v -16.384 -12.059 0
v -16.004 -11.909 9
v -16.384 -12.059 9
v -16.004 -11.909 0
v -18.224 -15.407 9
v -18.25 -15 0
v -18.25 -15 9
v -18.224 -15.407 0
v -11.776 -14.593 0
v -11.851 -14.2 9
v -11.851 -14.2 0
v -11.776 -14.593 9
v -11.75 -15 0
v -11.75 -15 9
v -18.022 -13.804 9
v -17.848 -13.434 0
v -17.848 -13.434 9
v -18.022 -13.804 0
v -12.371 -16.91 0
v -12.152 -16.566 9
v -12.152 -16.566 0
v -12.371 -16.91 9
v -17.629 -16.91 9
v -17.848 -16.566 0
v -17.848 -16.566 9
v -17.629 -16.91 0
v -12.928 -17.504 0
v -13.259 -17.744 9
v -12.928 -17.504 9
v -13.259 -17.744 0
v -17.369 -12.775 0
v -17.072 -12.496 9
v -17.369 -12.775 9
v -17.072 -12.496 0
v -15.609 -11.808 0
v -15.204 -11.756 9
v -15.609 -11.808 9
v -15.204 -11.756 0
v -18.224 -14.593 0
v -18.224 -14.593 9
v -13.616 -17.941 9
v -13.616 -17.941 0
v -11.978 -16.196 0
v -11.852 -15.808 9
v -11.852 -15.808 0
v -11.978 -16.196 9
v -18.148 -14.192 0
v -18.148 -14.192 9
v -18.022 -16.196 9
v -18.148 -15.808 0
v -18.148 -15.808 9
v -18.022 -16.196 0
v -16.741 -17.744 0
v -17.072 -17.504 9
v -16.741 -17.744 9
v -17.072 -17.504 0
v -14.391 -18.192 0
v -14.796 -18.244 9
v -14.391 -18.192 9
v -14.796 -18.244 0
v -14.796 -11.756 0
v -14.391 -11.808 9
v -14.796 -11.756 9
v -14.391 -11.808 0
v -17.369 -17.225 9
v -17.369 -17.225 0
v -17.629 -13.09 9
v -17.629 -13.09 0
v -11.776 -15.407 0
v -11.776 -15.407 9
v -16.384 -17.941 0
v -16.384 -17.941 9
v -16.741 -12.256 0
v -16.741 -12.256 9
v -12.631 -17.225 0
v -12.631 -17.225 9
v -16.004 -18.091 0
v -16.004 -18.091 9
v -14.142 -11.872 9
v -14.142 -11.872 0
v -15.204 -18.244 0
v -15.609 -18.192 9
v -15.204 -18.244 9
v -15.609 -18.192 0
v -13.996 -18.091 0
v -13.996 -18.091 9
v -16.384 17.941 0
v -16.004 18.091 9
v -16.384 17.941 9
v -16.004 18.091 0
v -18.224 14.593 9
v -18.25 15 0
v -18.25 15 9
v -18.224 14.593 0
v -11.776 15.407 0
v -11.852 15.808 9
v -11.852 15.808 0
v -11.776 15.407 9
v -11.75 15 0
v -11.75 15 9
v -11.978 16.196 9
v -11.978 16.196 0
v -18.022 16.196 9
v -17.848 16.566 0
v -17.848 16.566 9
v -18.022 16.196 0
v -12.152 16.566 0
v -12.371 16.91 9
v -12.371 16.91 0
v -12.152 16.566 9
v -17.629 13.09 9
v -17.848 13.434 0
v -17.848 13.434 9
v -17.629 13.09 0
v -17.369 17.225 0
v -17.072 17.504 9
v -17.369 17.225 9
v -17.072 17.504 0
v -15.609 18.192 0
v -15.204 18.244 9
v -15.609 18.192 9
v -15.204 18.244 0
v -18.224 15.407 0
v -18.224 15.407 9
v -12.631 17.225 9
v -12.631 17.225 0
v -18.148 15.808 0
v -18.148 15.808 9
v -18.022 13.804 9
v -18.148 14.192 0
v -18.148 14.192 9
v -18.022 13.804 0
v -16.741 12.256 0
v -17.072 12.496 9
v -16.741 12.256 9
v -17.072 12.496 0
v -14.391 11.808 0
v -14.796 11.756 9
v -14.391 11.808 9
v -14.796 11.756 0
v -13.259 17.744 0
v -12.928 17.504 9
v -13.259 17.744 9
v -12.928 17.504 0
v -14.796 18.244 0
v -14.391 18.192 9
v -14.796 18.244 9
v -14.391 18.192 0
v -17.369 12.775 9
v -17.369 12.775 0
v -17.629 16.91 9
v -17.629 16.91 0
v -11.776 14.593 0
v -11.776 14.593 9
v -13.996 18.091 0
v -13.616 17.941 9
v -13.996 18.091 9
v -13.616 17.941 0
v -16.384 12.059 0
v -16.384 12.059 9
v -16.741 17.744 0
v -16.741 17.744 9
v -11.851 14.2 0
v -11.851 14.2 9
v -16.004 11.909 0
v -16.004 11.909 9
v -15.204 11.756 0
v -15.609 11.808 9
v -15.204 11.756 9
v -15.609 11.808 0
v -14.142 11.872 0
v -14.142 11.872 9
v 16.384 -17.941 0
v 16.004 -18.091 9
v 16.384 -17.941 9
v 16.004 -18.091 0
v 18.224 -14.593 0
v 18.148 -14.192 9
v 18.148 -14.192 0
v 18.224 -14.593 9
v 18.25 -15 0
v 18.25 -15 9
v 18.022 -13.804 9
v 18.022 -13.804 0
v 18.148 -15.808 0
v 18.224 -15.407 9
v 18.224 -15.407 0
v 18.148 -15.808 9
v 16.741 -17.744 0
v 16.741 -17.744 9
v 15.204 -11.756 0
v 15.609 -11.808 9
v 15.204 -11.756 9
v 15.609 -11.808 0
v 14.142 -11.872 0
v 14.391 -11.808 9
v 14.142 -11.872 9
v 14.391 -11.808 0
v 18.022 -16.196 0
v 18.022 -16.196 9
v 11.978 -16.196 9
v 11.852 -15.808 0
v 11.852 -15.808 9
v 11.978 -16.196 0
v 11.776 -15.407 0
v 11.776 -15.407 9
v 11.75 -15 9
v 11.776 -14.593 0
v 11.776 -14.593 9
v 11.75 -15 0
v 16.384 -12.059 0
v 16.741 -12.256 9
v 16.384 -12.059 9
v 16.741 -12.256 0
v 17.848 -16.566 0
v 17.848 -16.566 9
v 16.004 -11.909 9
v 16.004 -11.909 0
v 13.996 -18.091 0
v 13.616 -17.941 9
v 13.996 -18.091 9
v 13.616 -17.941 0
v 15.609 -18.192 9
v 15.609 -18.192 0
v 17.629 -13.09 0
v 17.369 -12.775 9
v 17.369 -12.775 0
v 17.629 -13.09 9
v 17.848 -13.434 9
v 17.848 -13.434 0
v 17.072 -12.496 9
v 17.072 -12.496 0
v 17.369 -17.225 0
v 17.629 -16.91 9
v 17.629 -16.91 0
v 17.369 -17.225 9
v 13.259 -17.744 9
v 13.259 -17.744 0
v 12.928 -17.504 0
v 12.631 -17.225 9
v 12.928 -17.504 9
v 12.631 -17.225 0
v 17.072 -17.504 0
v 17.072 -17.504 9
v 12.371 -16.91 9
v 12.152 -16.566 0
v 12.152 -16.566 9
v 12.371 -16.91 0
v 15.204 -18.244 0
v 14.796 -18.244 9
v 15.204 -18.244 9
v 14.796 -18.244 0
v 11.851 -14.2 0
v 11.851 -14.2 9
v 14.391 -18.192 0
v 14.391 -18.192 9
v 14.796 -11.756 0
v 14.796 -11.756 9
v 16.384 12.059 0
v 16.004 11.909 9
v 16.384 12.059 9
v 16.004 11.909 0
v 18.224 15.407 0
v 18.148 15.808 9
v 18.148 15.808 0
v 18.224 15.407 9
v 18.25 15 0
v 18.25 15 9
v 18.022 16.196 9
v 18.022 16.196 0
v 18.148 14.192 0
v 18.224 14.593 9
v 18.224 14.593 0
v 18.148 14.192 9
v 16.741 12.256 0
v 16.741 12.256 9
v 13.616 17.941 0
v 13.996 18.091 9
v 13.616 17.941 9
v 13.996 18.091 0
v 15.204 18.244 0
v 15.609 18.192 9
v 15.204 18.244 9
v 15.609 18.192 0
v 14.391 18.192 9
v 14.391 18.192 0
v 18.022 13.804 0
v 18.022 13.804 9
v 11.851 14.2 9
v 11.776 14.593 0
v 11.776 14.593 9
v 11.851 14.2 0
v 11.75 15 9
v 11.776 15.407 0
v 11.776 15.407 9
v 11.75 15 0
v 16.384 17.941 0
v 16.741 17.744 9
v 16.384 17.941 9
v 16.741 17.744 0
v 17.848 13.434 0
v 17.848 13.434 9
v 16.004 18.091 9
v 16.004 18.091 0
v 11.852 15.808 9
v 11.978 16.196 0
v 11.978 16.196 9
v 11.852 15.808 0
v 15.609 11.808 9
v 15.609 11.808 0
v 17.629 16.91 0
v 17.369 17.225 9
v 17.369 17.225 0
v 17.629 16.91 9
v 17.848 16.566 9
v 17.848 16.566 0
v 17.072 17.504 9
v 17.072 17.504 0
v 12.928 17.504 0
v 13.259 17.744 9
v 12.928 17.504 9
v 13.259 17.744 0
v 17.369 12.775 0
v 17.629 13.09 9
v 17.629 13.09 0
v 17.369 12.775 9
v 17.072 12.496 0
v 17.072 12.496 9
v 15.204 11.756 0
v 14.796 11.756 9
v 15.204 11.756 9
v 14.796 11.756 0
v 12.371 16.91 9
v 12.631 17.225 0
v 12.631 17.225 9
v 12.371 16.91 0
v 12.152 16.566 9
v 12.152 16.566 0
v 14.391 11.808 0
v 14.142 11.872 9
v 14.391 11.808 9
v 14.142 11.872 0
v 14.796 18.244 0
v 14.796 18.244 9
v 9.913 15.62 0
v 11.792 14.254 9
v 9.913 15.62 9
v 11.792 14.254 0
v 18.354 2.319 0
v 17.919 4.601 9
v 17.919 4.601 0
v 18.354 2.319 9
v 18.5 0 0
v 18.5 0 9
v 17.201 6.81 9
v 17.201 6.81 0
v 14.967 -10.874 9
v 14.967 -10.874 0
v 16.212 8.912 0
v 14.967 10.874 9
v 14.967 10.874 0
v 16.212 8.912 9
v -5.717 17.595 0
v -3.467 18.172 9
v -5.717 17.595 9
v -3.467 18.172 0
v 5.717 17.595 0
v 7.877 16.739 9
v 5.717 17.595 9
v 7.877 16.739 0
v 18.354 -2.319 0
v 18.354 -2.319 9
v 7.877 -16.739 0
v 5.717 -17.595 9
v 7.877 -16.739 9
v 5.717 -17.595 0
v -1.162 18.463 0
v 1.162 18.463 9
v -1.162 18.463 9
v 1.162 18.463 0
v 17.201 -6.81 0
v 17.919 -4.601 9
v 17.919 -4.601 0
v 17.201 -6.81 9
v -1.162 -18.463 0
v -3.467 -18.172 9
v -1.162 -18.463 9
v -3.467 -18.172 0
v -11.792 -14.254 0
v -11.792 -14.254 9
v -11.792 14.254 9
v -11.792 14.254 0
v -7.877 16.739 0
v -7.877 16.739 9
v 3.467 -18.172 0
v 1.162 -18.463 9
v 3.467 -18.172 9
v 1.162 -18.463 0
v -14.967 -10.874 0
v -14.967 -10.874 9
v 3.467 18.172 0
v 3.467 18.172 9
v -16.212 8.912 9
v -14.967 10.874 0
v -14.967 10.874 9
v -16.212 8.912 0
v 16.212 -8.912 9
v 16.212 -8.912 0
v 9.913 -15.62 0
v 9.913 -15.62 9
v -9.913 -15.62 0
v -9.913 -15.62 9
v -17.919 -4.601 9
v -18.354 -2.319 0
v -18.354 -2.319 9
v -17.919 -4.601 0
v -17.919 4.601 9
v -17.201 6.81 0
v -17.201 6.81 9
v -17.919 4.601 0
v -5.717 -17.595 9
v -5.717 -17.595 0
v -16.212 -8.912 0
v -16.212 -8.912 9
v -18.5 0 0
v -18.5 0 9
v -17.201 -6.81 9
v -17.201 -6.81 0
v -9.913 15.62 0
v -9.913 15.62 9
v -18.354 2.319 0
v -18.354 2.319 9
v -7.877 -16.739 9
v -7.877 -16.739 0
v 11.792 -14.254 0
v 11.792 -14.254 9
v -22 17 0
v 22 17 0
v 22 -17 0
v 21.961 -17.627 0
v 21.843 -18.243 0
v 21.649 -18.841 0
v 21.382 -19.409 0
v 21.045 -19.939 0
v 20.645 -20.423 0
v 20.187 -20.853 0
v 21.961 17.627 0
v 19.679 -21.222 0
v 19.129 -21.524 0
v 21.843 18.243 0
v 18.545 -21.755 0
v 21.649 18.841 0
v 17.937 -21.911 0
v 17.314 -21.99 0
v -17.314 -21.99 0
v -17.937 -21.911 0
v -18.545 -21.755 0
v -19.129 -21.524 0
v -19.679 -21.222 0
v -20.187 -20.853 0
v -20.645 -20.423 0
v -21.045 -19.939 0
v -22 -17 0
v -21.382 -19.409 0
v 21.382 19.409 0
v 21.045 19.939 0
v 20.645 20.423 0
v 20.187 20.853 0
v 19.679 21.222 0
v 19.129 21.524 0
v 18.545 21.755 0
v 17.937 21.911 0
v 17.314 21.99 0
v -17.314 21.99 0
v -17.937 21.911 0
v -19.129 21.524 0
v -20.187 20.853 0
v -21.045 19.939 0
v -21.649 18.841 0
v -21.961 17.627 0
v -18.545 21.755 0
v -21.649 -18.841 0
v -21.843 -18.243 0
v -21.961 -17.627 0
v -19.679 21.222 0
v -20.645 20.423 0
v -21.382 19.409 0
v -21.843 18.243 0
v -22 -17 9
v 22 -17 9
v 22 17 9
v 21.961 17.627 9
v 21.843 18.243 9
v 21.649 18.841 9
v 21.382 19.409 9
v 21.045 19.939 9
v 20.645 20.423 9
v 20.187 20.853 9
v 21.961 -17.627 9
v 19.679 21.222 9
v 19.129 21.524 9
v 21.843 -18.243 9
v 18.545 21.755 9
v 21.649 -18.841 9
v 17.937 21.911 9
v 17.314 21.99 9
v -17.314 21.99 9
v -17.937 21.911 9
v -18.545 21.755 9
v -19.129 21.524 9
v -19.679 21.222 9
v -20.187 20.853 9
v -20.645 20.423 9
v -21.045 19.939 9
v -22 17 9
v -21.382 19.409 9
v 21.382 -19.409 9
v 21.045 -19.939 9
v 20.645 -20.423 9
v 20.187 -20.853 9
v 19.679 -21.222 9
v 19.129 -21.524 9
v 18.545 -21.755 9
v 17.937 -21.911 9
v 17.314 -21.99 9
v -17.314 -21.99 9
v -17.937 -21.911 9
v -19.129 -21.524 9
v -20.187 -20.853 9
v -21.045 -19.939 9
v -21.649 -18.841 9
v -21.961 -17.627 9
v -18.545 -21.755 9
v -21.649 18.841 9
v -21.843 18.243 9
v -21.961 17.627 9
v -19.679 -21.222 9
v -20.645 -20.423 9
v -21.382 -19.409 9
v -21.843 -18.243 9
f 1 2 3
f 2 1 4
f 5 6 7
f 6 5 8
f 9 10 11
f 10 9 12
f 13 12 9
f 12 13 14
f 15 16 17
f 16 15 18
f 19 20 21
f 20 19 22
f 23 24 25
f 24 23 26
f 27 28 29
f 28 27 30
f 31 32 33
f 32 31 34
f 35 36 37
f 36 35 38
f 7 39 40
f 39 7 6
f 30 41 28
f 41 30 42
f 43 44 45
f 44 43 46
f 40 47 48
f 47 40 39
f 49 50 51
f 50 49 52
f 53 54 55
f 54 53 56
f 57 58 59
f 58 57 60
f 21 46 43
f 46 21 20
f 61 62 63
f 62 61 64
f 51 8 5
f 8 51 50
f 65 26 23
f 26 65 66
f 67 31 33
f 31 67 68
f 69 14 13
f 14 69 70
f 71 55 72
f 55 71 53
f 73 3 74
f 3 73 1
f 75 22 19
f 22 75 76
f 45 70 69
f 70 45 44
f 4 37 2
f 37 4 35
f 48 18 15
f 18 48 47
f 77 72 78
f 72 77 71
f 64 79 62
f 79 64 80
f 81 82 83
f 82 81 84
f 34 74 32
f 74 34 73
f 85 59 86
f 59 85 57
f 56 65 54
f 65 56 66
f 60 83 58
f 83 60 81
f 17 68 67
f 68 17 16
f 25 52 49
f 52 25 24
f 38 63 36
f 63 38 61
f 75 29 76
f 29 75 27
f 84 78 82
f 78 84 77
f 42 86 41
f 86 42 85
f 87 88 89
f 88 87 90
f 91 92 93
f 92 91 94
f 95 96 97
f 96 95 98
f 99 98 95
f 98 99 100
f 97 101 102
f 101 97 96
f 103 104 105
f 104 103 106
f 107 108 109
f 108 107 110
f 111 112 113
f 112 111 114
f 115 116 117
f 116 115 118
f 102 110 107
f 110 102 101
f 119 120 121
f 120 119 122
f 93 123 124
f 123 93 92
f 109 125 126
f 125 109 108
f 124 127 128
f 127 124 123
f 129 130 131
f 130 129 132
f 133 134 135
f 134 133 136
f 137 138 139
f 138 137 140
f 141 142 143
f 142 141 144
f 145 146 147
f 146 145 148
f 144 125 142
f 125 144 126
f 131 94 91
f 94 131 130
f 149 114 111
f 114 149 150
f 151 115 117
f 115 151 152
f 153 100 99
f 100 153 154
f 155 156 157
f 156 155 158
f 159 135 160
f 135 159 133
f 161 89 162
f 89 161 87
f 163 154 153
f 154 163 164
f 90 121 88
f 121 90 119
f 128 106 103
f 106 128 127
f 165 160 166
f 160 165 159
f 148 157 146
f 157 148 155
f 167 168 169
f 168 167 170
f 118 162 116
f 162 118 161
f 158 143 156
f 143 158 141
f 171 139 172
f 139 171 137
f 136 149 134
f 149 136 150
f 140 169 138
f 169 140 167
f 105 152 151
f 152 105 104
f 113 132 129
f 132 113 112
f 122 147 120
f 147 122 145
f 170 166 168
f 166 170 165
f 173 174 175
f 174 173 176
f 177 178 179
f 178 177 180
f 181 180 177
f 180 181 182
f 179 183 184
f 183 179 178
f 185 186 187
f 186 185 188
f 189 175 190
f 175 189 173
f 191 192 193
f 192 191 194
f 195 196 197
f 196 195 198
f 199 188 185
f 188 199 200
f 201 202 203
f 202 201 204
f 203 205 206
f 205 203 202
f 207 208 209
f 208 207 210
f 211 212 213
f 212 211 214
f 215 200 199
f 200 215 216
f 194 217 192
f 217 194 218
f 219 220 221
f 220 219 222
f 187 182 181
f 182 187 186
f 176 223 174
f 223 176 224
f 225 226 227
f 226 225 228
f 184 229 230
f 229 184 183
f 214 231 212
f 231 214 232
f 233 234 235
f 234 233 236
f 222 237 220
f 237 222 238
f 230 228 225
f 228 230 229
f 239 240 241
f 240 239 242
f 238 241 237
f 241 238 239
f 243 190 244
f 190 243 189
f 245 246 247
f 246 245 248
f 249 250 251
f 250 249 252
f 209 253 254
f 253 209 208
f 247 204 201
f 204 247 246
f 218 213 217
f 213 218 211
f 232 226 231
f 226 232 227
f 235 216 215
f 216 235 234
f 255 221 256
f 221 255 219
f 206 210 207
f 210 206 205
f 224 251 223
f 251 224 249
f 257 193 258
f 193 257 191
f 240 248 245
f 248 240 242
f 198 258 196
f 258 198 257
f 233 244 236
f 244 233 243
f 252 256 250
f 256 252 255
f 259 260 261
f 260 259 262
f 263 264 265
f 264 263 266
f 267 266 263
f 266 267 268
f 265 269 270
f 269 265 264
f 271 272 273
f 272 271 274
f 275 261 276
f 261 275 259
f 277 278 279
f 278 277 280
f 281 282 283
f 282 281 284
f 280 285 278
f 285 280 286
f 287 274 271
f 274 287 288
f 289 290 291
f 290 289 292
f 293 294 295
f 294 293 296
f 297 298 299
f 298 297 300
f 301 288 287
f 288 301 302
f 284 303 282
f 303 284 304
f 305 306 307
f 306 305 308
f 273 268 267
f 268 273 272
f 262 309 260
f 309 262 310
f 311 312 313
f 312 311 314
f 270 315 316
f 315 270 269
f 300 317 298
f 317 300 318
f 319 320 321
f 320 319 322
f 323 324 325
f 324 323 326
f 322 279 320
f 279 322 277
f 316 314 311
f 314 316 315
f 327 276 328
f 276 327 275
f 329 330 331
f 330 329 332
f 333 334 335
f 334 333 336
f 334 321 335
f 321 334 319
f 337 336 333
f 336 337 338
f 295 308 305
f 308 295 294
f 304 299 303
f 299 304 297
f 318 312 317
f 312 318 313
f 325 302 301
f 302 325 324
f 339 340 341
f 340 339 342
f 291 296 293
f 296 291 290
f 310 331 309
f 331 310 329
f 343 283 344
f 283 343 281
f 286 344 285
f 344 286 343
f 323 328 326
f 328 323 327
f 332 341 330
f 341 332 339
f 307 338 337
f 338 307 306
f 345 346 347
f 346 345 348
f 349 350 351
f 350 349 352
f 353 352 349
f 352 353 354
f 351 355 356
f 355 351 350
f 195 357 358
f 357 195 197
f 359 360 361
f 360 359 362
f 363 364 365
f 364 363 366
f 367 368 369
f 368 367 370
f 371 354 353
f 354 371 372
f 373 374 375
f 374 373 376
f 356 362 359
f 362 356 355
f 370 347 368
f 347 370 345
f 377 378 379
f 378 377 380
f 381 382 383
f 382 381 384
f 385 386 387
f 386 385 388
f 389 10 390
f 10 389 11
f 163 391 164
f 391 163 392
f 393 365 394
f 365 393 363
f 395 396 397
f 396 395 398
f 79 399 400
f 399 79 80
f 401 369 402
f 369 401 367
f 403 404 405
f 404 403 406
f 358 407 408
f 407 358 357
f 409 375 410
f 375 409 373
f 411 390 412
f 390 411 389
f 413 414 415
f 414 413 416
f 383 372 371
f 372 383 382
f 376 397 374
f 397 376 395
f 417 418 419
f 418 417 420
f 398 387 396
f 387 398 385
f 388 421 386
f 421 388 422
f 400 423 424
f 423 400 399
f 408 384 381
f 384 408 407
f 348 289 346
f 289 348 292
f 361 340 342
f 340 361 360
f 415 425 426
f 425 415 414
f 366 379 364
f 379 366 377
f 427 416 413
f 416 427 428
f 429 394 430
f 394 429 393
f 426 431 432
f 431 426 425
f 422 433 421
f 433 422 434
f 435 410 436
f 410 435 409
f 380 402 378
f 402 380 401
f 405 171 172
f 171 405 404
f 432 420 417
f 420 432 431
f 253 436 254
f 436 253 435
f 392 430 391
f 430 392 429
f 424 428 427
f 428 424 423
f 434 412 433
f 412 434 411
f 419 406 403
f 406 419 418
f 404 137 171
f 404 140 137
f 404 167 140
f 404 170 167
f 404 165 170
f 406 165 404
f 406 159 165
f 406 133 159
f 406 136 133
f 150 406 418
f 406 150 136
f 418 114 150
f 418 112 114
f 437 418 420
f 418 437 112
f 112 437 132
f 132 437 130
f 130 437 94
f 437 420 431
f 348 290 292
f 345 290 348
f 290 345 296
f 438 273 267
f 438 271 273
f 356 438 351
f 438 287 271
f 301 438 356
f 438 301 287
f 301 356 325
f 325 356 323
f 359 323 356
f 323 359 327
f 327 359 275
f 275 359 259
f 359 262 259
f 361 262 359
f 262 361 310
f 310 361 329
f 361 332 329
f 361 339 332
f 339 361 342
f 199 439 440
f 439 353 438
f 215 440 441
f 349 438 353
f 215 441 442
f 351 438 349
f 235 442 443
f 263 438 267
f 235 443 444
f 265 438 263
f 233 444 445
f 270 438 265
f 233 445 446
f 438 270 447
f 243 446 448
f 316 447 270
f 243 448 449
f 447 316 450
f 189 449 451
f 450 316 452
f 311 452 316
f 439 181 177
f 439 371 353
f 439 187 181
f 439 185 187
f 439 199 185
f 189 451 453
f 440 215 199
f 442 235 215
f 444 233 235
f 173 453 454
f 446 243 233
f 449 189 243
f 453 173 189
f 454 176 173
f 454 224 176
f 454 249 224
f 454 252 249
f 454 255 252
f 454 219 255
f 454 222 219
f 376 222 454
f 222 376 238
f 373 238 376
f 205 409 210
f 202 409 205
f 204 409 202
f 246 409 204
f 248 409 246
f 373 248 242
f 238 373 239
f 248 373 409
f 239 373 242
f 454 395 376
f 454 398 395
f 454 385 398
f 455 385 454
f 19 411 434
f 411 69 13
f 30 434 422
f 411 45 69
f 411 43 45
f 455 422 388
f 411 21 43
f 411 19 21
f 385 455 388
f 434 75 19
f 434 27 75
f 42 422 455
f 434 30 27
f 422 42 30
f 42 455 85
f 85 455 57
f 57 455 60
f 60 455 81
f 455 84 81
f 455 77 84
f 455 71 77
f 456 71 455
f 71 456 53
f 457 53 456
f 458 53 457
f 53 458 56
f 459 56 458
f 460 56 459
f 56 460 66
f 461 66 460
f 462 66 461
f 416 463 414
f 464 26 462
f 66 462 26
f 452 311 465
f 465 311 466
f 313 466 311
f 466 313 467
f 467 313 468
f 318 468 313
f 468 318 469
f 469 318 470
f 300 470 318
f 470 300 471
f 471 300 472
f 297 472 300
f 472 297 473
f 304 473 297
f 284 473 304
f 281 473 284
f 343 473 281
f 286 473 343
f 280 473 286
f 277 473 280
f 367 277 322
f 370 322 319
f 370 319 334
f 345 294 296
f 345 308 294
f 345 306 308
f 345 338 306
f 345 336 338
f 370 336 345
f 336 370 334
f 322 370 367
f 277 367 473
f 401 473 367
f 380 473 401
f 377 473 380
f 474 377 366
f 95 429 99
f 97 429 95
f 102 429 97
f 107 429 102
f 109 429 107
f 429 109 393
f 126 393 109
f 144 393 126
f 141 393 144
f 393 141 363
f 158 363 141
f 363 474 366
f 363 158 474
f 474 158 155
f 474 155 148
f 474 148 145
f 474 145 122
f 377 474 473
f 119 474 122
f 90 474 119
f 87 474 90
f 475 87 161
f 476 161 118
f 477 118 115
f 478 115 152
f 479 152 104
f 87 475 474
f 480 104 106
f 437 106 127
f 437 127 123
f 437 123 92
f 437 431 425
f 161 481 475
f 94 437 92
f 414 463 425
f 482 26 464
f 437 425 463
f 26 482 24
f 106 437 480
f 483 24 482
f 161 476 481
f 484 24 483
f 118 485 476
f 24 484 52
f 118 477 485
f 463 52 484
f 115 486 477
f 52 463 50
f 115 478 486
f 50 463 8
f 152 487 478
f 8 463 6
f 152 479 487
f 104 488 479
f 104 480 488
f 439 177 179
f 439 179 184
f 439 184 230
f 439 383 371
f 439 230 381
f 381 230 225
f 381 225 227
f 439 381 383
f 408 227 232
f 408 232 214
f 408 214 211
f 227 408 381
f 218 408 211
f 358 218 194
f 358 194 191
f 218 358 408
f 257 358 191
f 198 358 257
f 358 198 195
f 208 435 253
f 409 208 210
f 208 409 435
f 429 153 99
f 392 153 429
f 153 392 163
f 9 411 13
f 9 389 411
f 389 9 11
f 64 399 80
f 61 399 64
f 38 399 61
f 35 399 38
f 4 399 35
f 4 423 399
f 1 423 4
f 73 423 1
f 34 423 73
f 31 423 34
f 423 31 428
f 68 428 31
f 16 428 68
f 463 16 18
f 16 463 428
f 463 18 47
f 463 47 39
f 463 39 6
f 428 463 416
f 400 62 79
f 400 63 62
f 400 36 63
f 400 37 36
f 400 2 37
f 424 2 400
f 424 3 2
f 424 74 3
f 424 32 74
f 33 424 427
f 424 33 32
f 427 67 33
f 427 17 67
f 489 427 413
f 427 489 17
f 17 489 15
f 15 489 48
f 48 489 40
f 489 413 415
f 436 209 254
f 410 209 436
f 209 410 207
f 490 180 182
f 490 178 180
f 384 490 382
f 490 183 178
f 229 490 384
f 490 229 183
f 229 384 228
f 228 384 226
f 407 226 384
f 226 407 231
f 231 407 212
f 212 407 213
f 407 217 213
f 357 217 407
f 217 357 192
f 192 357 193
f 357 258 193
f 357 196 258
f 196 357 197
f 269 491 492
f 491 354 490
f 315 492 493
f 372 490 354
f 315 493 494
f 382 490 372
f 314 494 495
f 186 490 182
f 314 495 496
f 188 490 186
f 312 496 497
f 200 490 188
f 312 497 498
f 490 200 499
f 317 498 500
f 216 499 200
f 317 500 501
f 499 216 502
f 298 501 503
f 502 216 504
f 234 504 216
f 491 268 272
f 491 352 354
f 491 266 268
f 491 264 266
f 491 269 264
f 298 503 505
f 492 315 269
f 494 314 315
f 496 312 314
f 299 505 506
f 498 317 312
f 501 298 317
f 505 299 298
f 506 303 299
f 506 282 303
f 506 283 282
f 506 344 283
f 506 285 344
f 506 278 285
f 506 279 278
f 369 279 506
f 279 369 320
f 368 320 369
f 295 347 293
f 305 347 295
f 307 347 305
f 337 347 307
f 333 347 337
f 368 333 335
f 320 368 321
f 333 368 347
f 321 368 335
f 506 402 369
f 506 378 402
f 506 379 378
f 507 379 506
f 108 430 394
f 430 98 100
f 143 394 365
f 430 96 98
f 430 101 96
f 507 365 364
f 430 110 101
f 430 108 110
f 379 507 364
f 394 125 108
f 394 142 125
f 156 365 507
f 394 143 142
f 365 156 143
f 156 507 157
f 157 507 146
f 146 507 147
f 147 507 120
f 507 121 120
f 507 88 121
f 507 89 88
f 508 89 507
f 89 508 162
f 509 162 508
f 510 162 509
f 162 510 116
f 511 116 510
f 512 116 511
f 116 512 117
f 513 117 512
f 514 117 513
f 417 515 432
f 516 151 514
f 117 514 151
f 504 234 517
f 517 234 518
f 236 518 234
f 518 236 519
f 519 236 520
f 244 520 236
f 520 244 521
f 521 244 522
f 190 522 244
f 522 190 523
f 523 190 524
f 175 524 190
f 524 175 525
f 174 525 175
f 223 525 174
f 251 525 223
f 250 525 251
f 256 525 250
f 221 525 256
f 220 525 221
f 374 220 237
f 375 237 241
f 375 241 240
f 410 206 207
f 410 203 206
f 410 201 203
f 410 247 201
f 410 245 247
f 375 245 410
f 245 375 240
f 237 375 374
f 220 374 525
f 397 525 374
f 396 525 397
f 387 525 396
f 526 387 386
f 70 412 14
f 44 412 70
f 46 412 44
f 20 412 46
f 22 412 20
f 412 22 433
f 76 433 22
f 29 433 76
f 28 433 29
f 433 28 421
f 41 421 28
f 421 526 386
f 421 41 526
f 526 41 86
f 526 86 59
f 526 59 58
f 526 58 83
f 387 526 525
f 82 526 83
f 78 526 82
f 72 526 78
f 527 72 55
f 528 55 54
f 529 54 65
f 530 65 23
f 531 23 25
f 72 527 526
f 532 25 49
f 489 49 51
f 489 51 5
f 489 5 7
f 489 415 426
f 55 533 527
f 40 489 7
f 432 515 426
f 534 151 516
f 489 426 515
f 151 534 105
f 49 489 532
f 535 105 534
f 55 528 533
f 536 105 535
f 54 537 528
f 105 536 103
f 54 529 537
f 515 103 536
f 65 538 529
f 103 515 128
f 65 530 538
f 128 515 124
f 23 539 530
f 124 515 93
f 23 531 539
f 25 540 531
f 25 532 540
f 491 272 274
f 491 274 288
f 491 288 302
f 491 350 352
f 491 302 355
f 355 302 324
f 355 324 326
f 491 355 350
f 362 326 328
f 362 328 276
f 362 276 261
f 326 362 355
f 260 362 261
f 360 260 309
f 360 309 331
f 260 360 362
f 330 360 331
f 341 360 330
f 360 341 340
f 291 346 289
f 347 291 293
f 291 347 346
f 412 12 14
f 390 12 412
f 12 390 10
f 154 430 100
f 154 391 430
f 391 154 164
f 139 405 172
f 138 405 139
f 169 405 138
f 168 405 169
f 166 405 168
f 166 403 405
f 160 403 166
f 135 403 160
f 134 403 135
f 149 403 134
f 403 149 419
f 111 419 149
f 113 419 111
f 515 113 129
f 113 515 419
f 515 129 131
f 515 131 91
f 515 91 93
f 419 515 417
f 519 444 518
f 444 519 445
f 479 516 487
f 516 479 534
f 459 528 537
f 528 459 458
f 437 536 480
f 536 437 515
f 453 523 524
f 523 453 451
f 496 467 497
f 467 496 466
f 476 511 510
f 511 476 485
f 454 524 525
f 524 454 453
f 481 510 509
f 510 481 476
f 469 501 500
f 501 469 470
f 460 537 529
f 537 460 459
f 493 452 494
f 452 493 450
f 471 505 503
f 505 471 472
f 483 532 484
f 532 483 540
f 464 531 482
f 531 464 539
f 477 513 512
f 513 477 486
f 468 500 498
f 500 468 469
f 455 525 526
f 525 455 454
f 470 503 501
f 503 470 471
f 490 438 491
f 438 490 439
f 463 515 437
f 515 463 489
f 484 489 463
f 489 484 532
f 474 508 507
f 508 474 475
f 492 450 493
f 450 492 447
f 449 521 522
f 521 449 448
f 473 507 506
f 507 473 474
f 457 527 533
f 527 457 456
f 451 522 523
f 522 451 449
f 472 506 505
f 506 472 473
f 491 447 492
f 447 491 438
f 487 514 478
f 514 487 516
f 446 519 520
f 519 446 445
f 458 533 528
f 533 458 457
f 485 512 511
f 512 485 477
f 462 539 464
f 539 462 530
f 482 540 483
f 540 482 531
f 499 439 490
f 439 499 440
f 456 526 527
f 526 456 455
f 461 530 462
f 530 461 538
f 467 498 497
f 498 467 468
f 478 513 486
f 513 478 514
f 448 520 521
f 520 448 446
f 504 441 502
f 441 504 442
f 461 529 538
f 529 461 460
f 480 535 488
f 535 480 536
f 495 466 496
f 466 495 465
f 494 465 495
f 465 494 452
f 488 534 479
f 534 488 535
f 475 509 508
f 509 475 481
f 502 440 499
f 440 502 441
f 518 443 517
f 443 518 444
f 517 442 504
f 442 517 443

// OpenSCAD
$fn = 50;


difference() {
	union() {
		hull() {
			translate(v = [-17.0000000000, 17.0000000000, 0]) {
				cylinder(h = 9, r = 5);
			}
			translate(v = [17.0000000000, 17.0000000000, 0]) {
				cylinder(h = 9, r = 5);
			}
			translate(v = [-17.0000000000, -17.0000000000, 0]) {
				cylinder(h = 9, r = 5);
			}
			translate(v = [17.0000000000, -17.0000000000, 0]) {
				cylinder(h = 9, r = 5);
			}
		}
	}
	union() {
		#translate(v = [-15.0000000000, -15.0000000000, -100.0000000000]) {
			cylinder(h = 200, r = 3.2500000000);
		}
		#translate(v = [-15.0000000000, 15.0000000000, -100.0000000000]) {
			cylinder(h = 200, r = 3.2500000000);
		}
		#translate(v = [15.0000000000, -15.0000000000, -100.0000000000]) {
			cylinder(h = 200, r = 3.2500000000);
		}
		#translate(v = [15.0000000000, 15.0000000000, -100.0000000000]) {
			cylinder(h = 200, r = 3.2500000000);
		}
		#cylinder(h = 9, r = 18.5000000000);
	}
}
